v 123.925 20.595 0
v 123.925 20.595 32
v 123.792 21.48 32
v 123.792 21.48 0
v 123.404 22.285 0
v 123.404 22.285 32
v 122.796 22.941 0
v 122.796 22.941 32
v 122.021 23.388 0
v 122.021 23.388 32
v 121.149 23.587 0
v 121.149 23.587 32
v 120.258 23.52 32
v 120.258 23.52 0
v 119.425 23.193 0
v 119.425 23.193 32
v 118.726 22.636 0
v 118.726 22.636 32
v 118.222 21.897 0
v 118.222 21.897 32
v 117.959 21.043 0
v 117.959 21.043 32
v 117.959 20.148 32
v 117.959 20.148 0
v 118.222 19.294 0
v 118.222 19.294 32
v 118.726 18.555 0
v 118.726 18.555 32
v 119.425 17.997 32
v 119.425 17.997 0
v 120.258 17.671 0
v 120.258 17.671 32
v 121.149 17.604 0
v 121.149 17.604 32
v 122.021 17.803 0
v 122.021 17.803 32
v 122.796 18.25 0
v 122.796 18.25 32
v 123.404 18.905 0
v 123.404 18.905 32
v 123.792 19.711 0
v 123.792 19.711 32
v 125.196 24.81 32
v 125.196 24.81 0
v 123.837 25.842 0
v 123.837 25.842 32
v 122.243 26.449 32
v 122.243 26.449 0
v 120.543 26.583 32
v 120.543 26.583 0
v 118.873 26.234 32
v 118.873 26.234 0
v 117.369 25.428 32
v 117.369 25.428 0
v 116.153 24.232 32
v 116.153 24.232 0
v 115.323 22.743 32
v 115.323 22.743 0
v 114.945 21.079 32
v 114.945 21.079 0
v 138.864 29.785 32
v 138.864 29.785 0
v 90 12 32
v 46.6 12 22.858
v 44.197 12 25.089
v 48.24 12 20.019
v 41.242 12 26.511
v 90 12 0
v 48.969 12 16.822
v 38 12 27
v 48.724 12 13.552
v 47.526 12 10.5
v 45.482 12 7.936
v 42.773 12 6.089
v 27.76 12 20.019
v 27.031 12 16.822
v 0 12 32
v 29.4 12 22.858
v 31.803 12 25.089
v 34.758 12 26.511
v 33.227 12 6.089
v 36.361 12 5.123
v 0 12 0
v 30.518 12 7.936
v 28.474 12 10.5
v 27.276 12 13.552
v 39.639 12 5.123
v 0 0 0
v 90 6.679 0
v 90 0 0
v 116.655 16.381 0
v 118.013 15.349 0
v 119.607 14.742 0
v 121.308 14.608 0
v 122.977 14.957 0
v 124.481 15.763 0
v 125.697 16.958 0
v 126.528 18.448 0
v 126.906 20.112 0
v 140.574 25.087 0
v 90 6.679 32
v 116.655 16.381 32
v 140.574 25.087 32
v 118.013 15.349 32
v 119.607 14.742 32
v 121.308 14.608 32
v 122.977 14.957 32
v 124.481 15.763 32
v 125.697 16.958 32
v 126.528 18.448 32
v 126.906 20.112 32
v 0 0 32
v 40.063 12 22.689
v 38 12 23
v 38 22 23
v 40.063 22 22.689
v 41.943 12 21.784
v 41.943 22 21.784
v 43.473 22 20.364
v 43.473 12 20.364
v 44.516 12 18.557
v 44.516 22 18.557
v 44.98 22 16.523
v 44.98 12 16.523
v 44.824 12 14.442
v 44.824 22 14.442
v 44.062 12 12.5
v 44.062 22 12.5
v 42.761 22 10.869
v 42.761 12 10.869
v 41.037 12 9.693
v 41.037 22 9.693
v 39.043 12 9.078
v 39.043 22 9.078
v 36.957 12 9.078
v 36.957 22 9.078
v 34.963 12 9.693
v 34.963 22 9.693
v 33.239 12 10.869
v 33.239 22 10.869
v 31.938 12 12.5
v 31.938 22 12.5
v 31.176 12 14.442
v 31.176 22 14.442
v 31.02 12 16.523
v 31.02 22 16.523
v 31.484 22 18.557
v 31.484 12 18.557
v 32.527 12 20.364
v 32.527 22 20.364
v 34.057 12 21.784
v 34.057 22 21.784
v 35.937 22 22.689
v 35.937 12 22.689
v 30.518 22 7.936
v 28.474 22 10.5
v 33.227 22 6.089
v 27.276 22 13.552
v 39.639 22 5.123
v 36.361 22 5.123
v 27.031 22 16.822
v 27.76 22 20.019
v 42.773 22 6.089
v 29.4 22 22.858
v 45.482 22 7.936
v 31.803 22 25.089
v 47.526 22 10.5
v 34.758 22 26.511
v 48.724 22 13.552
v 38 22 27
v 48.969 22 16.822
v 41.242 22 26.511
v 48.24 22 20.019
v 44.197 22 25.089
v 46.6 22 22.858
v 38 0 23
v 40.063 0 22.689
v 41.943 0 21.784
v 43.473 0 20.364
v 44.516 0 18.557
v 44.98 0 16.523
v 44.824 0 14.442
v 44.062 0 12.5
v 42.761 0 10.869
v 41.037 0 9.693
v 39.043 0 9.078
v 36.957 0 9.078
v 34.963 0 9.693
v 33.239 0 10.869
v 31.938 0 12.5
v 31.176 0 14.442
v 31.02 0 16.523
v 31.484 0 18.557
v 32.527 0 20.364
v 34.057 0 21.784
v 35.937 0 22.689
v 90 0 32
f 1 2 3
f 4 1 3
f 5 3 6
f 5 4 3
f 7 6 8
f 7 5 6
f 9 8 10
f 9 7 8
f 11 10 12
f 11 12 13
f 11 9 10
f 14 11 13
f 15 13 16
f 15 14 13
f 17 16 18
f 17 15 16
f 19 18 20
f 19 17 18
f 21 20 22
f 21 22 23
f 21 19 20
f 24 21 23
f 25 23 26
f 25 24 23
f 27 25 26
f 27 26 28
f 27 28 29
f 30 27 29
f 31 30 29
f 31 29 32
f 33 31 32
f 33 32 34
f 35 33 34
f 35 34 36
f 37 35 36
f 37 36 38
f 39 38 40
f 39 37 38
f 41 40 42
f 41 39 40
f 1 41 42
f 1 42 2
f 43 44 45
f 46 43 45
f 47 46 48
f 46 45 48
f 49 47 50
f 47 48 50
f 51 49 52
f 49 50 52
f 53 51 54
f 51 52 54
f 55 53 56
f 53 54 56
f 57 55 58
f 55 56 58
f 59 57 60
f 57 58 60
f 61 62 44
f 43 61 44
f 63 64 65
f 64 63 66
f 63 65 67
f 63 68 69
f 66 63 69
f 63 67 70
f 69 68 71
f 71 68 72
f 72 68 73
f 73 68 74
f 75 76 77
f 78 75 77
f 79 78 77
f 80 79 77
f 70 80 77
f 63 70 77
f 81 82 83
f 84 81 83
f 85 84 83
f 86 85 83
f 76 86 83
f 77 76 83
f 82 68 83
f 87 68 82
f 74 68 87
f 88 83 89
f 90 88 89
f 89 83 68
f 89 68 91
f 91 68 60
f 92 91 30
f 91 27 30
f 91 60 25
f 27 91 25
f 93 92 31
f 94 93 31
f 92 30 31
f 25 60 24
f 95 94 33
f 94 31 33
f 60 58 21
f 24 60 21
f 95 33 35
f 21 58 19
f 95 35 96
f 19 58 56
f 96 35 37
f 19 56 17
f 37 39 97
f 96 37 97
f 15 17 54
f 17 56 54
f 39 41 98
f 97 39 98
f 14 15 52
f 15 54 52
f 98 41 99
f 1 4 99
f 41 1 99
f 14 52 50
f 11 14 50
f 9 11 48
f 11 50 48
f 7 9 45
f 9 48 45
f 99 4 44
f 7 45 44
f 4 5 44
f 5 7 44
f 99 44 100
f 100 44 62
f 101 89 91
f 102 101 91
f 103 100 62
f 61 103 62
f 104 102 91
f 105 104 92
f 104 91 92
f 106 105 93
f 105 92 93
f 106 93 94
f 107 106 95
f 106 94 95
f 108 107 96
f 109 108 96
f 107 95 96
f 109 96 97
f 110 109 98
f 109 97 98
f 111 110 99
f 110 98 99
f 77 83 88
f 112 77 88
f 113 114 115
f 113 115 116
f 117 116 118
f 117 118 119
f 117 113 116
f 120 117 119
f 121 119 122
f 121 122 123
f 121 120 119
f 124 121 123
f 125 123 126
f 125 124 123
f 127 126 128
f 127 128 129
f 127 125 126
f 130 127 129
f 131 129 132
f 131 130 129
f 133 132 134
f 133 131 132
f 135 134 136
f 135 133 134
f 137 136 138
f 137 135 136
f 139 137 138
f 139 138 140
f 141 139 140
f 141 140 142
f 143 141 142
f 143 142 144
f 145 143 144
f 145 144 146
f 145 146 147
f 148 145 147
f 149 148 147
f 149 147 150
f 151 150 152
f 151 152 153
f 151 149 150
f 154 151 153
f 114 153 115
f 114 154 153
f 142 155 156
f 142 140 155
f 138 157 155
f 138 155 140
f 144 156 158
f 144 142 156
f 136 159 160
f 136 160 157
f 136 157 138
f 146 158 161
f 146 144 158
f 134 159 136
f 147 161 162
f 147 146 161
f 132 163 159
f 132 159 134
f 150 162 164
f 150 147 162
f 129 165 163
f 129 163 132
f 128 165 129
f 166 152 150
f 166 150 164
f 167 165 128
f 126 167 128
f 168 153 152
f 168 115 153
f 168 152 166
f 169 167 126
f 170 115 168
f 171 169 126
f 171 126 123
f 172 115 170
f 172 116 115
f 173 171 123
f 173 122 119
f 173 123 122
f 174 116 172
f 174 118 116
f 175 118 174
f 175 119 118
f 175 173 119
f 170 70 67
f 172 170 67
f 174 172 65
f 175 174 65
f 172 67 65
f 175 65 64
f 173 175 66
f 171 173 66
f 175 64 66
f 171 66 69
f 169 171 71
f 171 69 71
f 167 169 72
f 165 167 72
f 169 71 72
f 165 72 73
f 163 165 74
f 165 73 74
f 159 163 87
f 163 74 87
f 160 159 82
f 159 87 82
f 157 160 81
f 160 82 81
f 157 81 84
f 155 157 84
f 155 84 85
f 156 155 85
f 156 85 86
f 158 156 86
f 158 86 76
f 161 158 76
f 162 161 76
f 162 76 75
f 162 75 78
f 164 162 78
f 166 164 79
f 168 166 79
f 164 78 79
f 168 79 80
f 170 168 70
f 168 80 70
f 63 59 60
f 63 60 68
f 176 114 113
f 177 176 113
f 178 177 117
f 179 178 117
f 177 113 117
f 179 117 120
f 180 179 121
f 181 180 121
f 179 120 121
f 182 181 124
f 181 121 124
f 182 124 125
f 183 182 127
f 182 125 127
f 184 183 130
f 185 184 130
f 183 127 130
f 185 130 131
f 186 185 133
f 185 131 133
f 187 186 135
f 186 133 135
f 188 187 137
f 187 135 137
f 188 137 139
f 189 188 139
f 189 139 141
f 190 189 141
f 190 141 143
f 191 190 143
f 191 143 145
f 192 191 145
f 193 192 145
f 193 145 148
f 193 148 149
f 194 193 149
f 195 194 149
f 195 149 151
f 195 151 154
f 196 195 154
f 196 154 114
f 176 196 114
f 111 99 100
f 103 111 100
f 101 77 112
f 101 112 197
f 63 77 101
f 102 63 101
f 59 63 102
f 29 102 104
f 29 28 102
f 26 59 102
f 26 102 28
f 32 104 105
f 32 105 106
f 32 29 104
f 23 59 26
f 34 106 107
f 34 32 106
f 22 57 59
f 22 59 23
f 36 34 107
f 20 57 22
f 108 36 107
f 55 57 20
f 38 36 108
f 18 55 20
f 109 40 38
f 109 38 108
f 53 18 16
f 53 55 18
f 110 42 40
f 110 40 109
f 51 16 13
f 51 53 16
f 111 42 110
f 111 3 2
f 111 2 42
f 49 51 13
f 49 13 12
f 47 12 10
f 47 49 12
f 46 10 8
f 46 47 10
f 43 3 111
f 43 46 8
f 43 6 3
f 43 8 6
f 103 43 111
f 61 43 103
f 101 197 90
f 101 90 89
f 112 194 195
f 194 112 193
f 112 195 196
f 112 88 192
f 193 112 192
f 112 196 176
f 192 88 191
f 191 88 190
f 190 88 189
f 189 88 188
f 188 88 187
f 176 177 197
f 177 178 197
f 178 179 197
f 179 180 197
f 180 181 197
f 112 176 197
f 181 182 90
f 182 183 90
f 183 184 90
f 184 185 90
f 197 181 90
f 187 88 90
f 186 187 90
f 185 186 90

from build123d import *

# Parameters (mm, degrees)
SKETCH_1_R          = 3
EXTRUDE_1_DEPTH     = 32
SKETCH_2_R          = 11
SKETCH_2_R_2        = 7
EXTRUDE_4_DEPTH     = 10
SKETCH_2_5_R        = 7
CUT_EXTRUDE_1_DEPTH = 146.263175934


with BuildPart() as part:
    # 스케치1 → 보스-돌출1 (new body)
    with BuildSketch(Plane.XY):
        with BuildLine():
            Line((114.944745727, 21.079144946), (90, 12))
            Line((90, 12), (0, 12))
            Line((0, 12), (0, 0))
            Line((0, 0), (90, 0))
            Line((90, 0), (90, 6.679111138))
            Line((90, 6.679111138), (116.654846444, 16.380681842))
            ThreePointArc((116.654846444, 16.380681842), (122.977335083, 14.95725731), (126.90568272, 20.111681123))
            Line((126.90568272, 20.111681123), (140.574116997, 25.086584349))
            Line((140.574116997, 25.086584349), (138.864016281, 29.785047453))
            Line((138.864016281, 29.785047453), (125.195582003, 24.810144227))
            ThreePointArc((125.195582003, 24.810144227), (118.873093364, 26.233568759), (114.944745727, 21.079144946))
        make_face()
        with Locations((120.925214223, 20.595413034)):
            Circle(SKETCH_1_R, mode=Mode.SUBTRACT)
    extrude(amount=EXTRUDE_1_DEPTH)

    # 스케치2 → 보스-돌출4 (add)
    with BuildSketch(Plane(origin=(0, 12, 0), x_dir=(1, 0, 0), z_dir=(0, 1, 0))):
        with Locations((38, -16)):
            Circle(SKETCH_2_R)
        with Locations((38, -16)):
            Circle(SKETCH_2_R_2, mode=Mode.SUBTRACT)
    extrude(amount=EXTRUDE_4_DEPTH)

    # 스케치2<5> → 컷-돌출1 (cut, through all)
    with BuildSketch(Plane(origin=(0, 12, 0), x_dir=(1, 0, 0), z_dir=(0, 1, 0))):
        with Locations((38, -16)):
            Circle(SKETCH_2_5_R)
    extrude(amount=-CUT_EXTRUDE_1_DEPTH, mode=Mode.SUBTRACT)


solid = part.part
